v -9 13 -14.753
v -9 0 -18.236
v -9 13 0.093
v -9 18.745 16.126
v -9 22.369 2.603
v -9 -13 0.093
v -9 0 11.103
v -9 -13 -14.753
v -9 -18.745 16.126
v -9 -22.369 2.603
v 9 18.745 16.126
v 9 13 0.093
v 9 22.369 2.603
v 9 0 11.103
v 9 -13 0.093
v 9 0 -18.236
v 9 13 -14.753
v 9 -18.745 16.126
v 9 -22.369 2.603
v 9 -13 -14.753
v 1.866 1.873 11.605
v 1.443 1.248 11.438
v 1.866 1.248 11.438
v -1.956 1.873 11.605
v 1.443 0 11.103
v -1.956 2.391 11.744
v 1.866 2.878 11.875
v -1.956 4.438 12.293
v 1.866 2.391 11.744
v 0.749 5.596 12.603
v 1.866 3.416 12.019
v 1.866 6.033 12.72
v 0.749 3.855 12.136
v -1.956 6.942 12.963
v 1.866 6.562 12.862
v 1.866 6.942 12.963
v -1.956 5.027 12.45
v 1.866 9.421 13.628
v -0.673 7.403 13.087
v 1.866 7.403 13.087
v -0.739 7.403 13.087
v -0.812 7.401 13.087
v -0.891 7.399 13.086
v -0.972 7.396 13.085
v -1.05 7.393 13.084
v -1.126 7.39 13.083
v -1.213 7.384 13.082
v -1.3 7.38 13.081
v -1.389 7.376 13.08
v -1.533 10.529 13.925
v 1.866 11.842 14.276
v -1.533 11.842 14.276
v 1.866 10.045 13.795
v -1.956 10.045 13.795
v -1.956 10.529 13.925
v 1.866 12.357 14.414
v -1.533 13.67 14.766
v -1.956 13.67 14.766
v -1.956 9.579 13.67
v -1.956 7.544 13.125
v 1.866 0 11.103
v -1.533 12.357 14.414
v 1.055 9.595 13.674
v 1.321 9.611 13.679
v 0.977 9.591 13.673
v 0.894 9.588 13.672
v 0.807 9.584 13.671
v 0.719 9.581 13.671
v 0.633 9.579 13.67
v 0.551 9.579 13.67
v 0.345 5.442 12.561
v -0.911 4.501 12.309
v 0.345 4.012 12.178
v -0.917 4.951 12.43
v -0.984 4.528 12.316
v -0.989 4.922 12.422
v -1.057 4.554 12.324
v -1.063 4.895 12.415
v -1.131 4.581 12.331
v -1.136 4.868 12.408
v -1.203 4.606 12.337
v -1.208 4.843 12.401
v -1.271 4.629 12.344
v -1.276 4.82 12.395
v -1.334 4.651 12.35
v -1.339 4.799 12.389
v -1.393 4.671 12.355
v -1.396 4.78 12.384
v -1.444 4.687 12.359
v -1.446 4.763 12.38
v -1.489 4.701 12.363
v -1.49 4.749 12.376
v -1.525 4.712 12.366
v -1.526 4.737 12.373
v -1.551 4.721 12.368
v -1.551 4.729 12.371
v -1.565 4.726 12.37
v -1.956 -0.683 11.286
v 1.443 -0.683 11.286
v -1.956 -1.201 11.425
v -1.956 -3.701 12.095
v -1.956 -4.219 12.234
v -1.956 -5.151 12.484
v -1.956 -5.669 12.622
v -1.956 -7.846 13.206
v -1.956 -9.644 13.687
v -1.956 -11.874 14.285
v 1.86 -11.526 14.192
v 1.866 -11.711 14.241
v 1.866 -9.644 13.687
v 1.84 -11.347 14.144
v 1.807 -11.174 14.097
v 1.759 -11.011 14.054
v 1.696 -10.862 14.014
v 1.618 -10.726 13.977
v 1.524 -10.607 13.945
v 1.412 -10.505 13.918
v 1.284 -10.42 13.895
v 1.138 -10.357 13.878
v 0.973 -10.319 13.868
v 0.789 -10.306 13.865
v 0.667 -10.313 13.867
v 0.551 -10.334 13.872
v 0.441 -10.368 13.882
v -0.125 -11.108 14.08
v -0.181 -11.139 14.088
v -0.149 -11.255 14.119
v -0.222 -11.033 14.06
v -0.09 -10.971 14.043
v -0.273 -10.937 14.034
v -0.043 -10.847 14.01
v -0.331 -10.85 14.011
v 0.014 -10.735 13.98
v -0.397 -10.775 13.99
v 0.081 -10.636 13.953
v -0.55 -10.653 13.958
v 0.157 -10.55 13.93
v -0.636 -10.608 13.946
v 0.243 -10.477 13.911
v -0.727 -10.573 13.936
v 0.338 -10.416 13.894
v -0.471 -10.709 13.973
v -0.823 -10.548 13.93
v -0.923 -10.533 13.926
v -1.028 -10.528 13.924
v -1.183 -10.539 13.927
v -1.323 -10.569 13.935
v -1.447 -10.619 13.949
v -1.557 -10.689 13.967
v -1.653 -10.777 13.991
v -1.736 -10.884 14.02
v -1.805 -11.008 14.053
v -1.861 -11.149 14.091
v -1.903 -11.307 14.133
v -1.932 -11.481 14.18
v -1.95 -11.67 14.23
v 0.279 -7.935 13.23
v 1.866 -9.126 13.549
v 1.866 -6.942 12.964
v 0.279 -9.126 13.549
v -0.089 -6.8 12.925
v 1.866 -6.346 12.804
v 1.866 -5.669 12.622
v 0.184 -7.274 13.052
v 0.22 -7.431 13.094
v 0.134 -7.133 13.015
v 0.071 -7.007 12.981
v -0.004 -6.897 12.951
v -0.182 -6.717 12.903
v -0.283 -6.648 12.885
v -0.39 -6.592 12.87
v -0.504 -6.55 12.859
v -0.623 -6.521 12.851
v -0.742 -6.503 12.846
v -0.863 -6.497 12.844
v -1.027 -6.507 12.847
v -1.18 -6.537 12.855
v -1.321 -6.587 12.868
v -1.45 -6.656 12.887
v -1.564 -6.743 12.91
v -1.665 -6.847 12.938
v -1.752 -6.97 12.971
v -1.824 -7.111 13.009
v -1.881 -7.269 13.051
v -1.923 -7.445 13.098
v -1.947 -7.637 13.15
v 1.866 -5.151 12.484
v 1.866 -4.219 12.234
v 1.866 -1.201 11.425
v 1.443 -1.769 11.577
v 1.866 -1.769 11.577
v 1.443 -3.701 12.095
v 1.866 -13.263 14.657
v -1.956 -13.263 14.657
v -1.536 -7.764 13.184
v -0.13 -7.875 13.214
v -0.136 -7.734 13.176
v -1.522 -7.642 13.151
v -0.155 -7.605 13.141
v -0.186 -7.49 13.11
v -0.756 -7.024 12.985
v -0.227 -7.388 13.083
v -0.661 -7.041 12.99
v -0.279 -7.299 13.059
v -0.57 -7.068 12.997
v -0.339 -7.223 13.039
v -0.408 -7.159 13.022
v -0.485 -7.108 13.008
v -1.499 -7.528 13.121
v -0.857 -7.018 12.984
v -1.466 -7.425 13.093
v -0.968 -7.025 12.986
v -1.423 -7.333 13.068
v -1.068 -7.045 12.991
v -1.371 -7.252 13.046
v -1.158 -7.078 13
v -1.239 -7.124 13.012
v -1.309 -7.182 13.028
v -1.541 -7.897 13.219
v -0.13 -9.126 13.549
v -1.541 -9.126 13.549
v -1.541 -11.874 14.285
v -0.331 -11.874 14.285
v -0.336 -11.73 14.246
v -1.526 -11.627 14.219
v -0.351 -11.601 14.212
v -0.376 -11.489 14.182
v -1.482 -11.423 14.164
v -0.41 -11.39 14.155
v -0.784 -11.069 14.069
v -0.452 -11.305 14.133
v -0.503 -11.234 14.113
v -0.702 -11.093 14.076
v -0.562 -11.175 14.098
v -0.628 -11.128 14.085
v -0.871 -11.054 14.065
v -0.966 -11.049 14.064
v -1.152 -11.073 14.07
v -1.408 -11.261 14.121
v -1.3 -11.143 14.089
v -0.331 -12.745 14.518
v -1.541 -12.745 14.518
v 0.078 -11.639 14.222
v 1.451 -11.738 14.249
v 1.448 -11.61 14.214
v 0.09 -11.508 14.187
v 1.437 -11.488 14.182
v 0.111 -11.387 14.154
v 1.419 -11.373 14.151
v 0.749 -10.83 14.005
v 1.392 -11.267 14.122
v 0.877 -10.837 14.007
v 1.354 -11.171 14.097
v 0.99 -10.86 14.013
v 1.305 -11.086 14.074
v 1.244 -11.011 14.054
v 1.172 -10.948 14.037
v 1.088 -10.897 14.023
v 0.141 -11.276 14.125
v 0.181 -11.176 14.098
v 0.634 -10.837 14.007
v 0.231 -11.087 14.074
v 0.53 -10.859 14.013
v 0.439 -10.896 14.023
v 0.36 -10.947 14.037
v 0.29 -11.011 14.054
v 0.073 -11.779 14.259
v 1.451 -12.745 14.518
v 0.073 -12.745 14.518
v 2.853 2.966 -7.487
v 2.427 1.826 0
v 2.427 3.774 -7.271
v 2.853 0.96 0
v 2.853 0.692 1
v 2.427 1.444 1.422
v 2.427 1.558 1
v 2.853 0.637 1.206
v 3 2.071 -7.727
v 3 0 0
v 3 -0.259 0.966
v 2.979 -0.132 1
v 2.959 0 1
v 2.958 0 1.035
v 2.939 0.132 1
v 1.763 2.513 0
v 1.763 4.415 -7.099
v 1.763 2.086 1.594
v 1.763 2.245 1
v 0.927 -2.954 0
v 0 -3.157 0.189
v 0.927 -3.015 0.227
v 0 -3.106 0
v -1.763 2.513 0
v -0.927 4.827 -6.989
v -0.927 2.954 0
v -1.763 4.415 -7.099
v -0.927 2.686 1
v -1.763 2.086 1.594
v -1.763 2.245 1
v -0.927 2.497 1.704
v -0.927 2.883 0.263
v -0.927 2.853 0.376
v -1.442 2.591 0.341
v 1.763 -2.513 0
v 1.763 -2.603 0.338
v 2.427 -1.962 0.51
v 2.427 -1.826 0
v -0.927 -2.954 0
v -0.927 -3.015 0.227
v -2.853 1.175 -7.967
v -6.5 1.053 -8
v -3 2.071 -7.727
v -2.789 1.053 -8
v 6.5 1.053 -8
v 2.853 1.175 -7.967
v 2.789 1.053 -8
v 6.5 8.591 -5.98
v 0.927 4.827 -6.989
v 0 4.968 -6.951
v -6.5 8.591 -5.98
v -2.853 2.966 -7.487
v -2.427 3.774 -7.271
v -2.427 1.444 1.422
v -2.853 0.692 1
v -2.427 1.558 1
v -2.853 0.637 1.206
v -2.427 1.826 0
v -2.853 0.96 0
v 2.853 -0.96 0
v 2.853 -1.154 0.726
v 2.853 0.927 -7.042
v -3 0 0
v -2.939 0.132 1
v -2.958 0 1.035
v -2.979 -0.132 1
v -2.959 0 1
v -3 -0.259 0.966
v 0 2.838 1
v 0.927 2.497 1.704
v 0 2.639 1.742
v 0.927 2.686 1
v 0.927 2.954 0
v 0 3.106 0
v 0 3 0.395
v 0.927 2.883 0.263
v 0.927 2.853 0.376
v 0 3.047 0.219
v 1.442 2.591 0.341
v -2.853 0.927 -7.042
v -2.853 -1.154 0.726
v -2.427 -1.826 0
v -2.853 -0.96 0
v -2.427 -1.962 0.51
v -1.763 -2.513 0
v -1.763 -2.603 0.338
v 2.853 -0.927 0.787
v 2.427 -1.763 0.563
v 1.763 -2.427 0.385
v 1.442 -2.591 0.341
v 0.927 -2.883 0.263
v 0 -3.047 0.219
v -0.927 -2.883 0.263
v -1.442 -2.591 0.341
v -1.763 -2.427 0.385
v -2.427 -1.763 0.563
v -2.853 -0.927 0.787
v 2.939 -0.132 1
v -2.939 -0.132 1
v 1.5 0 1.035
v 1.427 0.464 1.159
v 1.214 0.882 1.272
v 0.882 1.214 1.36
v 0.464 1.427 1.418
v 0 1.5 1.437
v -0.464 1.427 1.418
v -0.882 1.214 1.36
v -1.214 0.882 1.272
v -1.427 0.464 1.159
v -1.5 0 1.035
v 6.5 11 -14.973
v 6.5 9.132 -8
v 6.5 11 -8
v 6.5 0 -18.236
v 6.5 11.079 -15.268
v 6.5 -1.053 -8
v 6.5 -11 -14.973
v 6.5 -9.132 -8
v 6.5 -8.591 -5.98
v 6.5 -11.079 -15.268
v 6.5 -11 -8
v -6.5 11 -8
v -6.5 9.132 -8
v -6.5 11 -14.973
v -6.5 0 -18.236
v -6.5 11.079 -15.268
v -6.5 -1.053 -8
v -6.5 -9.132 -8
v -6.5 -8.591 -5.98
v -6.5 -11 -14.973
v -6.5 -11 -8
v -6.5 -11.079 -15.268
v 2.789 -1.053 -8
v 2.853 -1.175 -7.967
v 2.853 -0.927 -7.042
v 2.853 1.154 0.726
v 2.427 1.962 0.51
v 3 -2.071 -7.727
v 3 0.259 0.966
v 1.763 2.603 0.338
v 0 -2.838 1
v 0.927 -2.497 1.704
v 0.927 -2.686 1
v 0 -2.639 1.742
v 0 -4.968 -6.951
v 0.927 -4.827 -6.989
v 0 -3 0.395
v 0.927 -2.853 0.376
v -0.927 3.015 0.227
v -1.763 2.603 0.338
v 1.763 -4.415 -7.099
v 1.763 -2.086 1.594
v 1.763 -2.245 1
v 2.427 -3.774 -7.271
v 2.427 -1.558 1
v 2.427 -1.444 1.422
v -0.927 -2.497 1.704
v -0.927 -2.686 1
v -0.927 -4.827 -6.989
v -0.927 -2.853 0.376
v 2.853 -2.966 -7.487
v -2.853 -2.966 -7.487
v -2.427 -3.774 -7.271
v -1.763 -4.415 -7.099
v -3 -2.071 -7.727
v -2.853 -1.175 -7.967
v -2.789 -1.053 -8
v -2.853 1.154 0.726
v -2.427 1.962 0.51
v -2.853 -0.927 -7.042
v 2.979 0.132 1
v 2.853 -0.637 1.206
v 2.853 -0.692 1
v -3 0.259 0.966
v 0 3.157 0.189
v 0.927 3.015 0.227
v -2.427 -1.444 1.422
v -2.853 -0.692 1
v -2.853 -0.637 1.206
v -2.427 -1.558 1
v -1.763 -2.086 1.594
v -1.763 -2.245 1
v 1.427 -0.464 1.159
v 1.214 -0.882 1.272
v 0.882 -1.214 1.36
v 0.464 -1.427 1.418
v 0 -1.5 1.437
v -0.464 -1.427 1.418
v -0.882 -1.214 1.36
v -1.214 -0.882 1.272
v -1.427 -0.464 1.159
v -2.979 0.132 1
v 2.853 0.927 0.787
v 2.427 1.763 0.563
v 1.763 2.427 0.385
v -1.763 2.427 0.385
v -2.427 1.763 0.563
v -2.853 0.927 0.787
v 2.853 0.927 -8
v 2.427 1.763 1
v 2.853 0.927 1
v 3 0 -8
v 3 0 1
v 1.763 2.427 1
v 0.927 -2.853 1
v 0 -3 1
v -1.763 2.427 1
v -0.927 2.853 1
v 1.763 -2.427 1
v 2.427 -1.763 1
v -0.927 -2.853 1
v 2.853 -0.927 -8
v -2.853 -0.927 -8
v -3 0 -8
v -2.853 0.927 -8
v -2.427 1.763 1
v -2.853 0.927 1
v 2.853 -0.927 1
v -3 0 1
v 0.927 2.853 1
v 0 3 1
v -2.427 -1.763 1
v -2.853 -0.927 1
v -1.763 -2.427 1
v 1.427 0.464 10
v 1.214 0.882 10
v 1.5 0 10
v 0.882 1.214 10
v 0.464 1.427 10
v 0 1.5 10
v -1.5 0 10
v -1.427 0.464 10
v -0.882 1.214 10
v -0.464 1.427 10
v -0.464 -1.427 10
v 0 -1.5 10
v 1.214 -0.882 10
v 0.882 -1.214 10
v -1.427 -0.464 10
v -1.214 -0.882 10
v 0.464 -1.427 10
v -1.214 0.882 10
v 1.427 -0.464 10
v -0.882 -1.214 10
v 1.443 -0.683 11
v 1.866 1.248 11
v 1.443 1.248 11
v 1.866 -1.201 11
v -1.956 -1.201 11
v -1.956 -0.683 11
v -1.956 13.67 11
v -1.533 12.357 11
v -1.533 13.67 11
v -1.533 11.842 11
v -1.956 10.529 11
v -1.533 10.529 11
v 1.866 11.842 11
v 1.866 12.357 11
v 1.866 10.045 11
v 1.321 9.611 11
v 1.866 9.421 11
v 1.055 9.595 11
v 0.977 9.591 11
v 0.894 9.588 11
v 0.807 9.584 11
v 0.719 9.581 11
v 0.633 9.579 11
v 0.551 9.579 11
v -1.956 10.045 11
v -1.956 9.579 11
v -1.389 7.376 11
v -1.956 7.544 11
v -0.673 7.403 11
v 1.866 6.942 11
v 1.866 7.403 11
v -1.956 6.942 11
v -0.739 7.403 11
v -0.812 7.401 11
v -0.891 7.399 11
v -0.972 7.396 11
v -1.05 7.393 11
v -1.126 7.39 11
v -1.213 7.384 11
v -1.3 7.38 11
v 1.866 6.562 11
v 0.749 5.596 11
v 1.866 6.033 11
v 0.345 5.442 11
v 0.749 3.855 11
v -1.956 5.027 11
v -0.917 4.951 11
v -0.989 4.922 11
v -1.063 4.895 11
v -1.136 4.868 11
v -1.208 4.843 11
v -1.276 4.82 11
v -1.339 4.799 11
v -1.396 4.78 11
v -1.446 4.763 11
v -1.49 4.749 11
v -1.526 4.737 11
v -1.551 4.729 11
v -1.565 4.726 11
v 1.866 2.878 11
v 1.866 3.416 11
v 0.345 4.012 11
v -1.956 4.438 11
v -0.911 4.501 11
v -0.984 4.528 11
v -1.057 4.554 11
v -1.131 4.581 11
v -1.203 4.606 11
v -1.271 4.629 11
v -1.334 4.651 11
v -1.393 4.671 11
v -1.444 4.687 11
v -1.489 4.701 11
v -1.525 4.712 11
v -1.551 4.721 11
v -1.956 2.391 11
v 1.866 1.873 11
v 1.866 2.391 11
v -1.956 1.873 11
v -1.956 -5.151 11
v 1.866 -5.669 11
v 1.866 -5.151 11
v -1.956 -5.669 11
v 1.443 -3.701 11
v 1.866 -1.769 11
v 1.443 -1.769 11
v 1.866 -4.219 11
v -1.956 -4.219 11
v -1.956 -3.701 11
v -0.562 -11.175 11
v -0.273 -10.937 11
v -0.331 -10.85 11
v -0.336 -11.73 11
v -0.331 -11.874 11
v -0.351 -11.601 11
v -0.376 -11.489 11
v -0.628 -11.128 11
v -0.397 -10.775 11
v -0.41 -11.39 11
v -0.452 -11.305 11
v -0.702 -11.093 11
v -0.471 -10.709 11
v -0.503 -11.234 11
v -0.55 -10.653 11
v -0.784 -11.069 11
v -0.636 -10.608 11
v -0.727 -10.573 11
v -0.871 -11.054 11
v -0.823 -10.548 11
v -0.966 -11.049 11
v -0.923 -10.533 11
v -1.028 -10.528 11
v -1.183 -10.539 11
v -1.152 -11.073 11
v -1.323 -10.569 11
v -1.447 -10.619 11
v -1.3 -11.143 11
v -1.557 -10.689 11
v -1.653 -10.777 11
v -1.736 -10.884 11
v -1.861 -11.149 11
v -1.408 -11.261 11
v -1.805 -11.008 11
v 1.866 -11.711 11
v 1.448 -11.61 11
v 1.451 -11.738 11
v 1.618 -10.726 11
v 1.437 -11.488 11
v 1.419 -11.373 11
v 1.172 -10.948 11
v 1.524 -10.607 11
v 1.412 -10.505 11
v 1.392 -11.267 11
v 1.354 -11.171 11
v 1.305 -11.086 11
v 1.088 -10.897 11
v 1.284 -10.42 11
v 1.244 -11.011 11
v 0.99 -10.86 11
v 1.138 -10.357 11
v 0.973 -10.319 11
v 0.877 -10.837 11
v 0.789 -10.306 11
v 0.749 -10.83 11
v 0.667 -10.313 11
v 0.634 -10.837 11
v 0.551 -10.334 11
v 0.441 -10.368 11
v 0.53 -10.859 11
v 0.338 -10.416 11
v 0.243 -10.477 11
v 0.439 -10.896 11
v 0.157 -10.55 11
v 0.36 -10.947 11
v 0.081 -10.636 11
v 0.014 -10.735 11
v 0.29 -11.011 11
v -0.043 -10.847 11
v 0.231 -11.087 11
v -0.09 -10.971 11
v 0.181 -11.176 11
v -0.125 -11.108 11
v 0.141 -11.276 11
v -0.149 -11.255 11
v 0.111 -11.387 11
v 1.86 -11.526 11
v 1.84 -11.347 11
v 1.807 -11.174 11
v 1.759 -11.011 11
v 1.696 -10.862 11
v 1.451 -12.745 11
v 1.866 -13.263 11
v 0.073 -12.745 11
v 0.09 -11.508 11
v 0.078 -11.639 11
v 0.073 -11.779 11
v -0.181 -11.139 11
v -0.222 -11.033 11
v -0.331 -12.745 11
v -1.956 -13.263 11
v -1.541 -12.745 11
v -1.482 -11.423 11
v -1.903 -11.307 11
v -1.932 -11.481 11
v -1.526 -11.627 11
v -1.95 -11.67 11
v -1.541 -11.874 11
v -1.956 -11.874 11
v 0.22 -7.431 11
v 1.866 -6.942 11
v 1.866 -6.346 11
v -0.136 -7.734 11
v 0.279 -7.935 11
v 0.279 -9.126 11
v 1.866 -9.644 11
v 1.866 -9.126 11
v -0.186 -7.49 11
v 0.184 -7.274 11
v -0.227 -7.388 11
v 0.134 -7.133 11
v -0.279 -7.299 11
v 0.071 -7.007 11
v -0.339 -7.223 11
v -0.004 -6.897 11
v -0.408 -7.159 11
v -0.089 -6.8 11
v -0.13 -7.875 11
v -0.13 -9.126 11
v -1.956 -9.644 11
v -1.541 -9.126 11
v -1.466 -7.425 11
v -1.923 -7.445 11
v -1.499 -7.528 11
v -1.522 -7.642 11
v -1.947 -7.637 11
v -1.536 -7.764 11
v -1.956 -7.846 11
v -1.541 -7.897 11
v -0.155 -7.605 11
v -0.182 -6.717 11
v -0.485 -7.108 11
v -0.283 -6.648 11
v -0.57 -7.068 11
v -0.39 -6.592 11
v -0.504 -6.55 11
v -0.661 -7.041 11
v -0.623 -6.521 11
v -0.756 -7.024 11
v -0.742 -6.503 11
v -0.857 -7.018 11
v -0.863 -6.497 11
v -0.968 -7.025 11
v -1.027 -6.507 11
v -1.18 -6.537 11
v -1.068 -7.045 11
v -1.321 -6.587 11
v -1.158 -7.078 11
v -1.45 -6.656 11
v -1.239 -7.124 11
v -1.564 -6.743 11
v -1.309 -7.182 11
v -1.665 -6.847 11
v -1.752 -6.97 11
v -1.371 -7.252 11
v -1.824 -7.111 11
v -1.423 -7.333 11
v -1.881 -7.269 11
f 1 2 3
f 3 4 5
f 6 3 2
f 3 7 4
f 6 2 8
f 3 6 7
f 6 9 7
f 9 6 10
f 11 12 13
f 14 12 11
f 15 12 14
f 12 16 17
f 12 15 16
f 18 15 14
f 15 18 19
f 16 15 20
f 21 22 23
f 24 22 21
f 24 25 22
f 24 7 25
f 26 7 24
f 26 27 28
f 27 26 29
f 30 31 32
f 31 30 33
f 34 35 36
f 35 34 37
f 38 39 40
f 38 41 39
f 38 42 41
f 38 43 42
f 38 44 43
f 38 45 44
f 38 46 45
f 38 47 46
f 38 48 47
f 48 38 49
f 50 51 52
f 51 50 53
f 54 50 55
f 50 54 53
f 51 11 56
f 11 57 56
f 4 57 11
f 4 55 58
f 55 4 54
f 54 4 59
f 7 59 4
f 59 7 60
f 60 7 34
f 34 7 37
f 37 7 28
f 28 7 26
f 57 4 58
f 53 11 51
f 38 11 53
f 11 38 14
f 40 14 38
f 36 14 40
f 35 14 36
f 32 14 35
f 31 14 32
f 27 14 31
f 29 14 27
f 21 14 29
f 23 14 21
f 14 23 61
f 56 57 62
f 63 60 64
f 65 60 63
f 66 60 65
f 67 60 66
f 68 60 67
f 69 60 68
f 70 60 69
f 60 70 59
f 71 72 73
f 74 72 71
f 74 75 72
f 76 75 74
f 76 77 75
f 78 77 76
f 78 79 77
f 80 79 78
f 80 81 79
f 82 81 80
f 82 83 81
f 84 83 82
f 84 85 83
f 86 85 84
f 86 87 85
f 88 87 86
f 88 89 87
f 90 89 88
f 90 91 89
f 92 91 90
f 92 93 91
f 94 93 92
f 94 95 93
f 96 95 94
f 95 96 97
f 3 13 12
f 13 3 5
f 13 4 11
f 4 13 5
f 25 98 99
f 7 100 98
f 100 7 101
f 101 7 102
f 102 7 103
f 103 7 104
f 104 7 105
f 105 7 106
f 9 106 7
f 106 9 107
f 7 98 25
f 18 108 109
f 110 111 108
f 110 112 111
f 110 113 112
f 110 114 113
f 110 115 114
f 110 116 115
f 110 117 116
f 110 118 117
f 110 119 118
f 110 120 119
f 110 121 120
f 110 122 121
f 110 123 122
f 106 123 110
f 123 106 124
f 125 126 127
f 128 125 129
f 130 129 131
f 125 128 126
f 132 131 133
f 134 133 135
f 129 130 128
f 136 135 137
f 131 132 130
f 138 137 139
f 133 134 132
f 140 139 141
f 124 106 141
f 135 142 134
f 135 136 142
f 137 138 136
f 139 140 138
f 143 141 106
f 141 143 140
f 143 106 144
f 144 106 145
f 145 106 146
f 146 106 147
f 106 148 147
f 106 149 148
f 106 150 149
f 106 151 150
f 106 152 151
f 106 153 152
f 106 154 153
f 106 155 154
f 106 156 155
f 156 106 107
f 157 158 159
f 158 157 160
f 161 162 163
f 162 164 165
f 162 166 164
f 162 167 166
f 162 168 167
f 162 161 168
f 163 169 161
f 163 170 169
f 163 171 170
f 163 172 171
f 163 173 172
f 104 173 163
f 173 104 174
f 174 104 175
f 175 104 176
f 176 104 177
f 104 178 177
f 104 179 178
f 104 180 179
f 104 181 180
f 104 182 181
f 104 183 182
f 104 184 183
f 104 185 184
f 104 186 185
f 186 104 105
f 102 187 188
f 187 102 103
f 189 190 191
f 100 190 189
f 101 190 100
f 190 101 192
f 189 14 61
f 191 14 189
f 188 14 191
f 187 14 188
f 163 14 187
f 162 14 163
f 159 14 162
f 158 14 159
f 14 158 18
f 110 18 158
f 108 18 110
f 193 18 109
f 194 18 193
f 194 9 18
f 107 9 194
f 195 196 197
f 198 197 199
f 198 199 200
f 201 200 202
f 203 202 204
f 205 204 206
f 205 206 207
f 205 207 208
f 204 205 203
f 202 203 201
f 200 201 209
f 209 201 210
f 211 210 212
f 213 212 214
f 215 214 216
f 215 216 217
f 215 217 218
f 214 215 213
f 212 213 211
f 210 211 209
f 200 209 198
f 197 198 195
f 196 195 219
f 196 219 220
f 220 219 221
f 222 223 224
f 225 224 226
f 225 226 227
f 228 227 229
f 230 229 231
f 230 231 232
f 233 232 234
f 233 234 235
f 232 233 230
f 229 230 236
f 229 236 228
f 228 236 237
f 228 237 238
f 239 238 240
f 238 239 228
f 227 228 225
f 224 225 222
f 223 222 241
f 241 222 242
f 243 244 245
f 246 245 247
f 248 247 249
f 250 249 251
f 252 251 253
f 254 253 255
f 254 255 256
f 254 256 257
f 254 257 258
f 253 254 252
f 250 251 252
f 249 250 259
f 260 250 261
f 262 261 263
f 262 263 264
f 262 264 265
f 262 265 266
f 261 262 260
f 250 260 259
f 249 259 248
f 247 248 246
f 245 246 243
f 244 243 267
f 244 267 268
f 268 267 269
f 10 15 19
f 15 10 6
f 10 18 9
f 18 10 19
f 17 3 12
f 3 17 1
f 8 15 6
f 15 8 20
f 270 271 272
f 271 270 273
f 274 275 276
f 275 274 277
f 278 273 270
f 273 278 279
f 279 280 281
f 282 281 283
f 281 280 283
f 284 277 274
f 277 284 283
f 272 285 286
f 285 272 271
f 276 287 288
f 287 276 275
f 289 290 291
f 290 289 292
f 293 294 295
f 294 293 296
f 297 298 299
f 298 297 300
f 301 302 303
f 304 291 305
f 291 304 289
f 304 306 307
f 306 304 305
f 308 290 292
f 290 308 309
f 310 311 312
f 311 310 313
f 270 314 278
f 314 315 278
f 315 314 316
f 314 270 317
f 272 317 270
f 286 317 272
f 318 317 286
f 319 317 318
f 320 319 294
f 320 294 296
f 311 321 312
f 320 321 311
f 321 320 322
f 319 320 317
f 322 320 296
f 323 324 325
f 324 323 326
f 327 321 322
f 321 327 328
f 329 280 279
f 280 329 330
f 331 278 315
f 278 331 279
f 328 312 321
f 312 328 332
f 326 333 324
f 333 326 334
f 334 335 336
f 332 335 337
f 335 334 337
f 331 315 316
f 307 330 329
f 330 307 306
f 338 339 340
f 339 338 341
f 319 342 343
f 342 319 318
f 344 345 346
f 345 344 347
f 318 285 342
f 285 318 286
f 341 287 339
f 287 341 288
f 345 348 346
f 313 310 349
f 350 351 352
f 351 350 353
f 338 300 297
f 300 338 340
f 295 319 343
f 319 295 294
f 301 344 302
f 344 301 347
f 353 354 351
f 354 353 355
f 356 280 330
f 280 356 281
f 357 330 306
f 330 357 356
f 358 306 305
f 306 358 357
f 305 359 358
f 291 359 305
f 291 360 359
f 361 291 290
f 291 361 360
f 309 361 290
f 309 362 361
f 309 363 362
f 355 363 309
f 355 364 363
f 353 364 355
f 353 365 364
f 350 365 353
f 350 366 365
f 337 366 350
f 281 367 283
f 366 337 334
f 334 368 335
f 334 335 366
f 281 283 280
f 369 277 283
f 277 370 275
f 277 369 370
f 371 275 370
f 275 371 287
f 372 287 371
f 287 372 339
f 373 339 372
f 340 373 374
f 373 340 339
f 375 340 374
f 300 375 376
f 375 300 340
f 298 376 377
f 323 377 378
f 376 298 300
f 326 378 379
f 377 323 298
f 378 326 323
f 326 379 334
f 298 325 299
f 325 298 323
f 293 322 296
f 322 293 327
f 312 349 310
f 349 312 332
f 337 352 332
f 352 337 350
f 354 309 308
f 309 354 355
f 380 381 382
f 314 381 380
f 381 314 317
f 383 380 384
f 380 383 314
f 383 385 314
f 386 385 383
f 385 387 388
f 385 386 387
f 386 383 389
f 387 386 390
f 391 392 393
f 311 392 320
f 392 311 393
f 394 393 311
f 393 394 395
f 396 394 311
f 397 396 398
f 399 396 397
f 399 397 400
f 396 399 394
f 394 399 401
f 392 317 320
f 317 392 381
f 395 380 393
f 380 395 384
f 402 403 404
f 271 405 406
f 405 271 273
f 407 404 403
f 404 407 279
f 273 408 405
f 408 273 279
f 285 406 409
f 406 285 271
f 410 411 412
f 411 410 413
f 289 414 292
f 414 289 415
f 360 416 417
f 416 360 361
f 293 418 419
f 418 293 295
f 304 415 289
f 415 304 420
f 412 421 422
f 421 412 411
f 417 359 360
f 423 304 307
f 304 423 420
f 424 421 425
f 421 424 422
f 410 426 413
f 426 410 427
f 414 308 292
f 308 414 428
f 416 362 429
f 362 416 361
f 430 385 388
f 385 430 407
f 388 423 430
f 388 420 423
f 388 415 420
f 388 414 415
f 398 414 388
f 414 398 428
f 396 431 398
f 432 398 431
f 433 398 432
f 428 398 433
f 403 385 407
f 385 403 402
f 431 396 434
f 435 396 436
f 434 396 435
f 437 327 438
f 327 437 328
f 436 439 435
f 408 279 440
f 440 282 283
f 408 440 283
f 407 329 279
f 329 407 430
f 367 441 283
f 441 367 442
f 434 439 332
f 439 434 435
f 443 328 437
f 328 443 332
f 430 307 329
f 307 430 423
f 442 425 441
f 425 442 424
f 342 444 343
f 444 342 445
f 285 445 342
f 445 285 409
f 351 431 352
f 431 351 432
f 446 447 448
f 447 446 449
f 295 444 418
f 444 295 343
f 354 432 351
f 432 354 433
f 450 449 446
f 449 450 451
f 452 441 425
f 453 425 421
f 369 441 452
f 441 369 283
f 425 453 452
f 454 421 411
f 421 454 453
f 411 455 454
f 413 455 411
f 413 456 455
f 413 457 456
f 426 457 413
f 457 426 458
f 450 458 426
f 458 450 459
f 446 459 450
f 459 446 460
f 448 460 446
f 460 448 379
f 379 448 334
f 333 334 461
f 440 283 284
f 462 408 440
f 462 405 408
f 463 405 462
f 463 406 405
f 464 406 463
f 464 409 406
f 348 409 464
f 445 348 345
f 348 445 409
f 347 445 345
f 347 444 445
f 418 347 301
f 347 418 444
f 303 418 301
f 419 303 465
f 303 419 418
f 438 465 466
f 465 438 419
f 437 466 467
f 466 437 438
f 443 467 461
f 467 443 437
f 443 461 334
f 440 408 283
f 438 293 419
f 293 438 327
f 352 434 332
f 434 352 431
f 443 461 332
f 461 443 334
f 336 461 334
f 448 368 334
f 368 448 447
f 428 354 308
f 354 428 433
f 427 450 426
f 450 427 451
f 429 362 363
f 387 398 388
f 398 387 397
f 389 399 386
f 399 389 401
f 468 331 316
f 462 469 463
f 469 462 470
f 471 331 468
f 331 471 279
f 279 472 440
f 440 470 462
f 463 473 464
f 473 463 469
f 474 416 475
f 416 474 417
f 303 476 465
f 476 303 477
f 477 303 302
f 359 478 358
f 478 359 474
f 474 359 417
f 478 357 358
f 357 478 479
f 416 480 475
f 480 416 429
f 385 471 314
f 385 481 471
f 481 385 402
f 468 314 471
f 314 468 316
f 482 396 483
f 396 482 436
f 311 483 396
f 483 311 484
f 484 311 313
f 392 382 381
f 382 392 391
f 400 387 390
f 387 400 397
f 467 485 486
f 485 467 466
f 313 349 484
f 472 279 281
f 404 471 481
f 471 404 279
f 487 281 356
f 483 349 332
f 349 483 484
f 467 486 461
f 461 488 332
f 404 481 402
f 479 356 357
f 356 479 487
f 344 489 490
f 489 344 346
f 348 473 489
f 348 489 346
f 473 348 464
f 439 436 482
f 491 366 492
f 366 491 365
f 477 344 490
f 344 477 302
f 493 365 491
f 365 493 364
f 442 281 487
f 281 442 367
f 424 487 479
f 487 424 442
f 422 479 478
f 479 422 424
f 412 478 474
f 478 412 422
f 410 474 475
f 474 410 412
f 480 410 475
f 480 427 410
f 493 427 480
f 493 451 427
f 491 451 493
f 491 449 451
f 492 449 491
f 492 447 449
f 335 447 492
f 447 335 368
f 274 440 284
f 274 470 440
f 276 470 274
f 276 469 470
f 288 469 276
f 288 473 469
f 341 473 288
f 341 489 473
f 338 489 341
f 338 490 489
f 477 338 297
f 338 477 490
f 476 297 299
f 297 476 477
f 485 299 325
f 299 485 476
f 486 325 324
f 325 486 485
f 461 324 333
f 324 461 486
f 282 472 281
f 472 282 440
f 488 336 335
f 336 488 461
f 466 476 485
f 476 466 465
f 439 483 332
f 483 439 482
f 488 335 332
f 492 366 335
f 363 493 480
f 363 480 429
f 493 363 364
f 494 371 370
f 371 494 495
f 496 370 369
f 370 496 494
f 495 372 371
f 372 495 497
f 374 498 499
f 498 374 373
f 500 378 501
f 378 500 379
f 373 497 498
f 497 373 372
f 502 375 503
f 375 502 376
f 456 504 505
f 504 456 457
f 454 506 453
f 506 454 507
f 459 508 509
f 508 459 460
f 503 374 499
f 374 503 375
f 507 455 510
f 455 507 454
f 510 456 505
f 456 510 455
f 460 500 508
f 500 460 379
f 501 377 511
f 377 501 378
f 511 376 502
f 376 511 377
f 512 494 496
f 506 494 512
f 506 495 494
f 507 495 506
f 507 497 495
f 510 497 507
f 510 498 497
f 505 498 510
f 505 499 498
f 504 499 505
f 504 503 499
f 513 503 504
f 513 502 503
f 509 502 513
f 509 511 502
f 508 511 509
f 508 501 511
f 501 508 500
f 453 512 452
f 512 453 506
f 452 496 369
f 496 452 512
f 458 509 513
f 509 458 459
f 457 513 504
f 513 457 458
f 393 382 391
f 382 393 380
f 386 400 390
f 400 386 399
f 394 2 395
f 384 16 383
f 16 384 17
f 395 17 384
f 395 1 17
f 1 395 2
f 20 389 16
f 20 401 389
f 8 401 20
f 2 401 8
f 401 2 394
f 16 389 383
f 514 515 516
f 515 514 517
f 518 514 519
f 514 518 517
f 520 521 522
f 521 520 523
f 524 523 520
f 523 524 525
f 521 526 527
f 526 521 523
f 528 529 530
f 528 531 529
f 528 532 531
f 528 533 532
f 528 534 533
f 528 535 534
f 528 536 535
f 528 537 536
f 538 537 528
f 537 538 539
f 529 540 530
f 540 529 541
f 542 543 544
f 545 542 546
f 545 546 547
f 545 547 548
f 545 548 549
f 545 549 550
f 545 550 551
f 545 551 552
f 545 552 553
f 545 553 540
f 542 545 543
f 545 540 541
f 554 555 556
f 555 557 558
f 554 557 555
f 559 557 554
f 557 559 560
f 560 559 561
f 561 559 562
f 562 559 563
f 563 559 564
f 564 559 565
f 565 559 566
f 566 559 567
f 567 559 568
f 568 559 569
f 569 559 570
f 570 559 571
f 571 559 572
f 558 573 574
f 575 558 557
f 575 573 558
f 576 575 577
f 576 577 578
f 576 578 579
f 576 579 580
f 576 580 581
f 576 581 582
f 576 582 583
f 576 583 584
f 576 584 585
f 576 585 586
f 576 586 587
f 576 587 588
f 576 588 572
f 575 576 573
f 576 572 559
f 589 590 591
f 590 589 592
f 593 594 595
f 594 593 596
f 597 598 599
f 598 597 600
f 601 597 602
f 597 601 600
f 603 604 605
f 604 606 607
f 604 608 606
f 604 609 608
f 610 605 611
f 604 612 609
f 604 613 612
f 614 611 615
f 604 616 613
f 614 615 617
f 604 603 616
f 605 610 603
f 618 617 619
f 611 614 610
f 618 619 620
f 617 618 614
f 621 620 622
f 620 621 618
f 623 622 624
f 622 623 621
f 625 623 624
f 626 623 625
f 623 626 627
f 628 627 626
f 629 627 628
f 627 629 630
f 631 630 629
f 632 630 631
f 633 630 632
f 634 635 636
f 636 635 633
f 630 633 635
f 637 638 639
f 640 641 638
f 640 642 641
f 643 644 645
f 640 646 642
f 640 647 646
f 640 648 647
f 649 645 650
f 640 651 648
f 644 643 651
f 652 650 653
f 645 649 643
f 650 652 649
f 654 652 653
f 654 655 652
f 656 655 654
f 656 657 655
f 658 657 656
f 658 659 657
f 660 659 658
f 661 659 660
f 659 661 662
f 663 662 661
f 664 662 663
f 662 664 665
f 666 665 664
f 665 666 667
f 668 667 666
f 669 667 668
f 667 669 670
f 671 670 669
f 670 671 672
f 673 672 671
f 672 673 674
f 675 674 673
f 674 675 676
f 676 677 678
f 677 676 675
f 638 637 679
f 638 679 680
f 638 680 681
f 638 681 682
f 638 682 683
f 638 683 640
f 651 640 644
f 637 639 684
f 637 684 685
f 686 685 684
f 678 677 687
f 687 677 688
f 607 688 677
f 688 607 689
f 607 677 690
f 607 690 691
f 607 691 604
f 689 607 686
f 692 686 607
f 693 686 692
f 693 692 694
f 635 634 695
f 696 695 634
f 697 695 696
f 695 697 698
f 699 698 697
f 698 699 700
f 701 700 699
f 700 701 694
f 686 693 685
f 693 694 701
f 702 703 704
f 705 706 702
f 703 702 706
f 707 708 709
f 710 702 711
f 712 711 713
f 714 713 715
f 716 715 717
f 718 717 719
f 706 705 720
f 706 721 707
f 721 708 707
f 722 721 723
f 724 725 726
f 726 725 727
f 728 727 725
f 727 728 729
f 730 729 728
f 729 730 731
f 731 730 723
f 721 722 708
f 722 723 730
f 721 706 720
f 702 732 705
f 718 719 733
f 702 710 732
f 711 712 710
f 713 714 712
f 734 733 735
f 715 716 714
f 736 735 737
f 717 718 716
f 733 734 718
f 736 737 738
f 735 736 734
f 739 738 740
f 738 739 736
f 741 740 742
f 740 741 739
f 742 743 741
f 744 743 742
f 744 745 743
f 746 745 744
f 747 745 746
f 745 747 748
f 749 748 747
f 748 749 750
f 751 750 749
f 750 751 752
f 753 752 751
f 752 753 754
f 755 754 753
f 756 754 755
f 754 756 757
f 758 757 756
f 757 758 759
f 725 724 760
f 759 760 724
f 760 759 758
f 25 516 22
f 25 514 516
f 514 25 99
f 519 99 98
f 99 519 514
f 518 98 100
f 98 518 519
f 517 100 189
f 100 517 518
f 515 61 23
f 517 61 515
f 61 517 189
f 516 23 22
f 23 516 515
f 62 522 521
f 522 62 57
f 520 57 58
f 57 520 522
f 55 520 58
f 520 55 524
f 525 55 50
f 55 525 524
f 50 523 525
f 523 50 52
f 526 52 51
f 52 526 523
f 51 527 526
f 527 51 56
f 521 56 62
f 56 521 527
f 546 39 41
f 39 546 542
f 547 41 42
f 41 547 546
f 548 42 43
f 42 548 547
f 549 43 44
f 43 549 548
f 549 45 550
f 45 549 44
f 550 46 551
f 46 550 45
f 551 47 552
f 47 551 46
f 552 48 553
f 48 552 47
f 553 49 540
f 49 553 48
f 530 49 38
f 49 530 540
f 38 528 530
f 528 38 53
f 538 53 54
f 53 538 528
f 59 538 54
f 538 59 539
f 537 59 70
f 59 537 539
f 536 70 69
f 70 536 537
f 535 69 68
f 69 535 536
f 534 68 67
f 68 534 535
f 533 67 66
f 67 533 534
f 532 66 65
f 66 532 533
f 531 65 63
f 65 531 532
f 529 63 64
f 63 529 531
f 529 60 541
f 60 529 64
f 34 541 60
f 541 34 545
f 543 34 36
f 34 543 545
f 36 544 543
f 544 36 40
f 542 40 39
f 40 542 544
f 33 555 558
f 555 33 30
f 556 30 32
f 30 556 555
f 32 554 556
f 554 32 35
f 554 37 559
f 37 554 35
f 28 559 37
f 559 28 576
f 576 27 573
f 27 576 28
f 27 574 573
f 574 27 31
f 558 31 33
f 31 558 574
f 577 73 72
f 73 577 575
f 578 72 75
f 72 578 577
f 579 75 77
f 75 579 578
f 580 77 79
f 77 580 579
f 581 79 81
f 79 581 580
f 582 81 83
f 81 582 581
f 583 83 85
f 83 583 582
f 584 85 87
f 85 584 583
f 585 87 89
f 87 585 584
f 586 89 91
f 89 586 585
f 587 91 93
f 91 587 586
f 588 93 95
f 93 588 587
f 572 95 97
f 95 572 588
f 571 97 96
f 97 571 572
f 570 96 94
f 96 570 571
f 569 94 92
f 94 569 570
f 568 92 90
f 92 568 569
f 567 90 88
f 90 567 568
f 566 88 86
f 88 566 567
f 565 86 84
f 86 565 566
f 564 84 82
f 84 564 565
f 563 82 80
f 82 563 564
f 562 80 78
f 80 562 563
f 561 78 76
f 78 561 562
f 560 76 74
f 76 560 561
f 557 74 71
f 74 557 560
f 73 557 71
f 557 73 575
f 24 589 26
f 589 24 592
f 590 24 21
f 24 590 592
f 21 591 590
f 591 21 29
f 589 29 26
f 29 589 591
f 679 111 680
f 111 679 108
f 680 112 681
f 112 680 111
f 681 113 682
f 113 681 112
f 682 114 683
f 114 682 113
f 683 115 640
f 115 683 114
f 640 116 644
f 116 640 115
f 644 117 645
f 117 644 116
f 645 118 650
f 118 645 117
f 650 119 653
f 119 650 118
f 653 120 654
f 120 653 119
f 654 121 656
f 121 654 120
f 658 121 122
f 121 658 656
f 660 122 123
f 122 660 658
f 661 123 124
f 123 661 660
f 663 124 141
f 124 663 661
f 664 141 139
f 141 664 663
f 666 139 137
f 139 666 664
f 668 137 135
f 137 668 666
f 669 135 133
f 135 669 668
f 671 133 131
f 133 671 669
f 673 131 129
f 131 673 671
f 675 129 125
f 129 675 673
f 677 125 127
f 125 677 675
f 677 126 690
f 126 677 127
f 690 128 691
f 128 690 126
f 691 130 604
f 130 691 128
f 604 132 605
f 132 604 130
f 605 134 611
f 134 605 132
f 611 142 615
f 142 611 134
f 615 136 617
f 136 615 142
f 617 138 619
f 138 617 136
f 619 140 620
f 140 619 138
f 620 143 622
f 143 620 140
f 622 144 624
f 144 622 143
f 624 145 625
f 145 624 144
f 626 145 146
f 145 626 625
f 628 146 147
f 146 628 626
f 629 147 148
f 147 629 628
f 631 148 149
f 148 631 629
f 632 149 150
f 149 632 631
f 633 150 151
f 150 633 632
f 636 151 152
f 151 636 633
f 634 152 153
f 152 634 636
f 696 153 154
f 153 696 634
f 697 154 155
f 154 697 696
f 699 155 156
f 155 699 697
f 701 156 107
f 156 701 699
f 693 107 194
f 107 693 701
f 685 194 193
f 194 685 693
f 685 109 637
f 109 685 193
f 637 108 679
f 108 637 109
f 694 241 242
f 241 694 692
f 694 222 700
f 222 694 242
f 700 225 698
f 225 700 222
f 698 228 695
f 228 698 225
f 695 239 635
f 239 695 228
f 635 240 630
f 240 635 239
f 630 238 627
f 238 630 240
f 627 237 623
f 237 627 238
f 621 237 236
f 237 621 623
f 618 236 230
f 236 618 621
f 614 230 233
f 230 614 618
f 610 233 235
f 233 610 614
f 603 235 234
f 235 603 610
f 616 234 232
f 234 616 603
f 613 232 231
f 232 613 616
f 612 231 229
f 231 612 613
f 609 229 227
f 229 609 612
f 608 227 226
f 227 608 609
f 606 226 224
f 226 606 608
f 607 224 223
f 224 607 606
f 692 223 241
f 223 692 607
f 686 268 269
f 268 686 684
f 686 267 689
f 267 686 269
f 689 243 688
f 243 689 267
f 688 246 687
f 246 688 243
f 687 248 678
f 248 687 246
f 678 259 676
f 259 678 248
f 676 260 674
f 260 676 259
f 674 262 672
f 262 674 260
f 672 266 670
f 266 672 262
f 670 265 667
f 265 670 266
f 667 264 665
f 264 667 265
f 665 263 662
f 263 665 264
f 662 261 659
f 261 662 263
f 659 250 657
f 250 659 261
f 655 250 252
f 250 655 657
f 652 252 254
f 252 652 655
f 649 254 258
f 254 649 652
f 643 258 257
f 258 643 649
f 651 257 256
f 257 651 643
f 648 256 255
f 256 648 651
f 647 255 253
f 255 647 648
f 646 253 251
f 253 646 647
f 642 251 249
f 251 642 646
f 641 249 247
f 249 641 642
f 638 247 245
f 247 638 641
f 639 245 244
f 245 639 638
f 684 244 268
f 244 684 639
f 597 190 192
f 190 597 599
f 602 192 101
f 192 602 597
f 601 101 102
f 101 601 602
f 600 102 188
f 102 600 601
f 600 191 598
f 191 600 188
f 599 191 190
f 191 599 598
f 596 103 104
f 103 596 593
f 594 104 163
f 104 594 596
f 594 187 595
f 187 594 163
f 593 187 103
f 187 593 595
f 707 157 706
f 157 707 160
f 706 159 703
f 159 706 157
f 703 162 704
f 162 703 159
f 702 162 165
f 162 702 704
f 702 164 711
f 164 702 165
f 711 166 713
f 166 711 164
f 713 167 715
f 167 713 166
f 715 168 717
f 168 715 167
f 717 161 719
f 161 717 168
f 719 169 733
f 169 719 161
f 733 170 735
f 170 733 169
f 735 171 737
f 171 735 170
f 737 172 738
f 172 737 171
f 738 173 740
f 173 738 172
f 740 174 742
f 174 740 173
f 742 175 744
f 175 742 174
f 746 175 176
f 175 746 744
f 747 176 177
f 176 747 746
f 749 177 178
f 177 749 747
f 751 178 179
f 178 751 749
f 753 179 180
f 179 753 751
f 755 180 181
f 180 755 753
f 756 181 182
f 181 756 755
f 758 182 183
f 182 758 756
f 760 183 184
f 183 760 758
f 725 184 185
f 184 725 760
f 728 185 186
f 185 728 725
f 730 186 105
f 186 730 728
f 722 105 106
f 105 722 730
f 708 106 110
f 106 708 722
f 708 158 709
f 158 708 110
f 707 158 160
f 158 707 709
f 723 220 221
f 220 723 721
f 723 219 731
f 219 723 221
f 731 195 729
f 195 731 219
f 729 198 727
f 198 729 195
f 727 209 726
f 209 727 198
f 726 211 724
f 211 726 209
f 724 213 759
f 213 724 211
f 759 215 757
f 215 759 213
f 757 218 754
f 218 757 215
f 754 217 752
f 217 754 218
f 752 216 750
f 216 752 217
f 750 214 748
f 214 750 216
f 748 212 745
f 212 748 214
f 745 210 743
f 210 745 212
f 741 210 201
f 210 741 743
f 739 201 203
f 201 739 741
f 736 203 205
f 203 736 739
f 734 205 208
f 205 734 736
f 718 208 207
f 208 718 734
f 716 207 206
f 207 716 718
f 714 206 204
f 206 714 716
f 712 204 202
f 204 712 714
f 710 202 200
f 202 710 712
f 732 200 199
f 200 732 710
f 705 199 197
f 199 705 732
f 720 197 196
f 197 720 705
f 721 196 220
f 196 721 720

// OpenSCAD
$fn = 20;

//font = "Liberation Sans";
 //translate([0,0,15]) rotate([0,0,90]) scale([0.4,0.4,10]) {
 //  text("BRILLIANT", font = "Helvetica",halign="center",valign="center");
 //}

translate([0,0,8]) fullAssym();
//color("red",alpha=0.5) rotate([15,0,0]) translate([0,0,8]) fullAssym();
//color("blue",alpha=0.5) rotate([-15,0,0]) translate([0,0,8]) fullAssym();

module positives(){
    translate([0,8,-2]) rotate([15,0,0]) cube([18,26,14],center=true);
    translate([0,-8,-2]) rotate([-15,0,0]) cube([18,26,14],center=true);
    translate([0,0,-17+2]) rotate([0,0,0]) cube([18,26,24],center=true);
}

module negatives(){
    translate([0,0,9]) cylinder(9,1.5,1.5);
    translate([0,0,8]) rotate([15,0,0]) translate([0,0,-8]) swBody();
    translate([0,0,8]) rotate([-15,0,0]) translate([0,0,-8]) swBody();
    translate([0,0,8]) rotate([0,0,0]) translate([0,0,-8]) swBody();
    translate([0,0,-20]) cube([13,18+4,1*40],center=true);
    translate([0,0,-50-12]) rotate([15,0,0]) cube([20,60,100],center=true);
    translate([0,0,-50-12]) rotate([-15,0,0]) cube([20,60,100],center=true);
     translate([0,0,15+4]) rotate([0,0,90]) scale([0.4,0.4,4]) linear_extrude(height=5){
   text("BRILLIANT", font = "Helvetica",halign="center",valign="center");
 }
}

module swBody(){
    cylinder(9,3,3);
    translate([0,0,-11/2]) rotate([0,0,0]) cube([13,13.5,1*11],center=true);
}
 
module fullAssym(){
    difference(){
    positives();
    translate([0,0,-16]) negatives();
    }
}
